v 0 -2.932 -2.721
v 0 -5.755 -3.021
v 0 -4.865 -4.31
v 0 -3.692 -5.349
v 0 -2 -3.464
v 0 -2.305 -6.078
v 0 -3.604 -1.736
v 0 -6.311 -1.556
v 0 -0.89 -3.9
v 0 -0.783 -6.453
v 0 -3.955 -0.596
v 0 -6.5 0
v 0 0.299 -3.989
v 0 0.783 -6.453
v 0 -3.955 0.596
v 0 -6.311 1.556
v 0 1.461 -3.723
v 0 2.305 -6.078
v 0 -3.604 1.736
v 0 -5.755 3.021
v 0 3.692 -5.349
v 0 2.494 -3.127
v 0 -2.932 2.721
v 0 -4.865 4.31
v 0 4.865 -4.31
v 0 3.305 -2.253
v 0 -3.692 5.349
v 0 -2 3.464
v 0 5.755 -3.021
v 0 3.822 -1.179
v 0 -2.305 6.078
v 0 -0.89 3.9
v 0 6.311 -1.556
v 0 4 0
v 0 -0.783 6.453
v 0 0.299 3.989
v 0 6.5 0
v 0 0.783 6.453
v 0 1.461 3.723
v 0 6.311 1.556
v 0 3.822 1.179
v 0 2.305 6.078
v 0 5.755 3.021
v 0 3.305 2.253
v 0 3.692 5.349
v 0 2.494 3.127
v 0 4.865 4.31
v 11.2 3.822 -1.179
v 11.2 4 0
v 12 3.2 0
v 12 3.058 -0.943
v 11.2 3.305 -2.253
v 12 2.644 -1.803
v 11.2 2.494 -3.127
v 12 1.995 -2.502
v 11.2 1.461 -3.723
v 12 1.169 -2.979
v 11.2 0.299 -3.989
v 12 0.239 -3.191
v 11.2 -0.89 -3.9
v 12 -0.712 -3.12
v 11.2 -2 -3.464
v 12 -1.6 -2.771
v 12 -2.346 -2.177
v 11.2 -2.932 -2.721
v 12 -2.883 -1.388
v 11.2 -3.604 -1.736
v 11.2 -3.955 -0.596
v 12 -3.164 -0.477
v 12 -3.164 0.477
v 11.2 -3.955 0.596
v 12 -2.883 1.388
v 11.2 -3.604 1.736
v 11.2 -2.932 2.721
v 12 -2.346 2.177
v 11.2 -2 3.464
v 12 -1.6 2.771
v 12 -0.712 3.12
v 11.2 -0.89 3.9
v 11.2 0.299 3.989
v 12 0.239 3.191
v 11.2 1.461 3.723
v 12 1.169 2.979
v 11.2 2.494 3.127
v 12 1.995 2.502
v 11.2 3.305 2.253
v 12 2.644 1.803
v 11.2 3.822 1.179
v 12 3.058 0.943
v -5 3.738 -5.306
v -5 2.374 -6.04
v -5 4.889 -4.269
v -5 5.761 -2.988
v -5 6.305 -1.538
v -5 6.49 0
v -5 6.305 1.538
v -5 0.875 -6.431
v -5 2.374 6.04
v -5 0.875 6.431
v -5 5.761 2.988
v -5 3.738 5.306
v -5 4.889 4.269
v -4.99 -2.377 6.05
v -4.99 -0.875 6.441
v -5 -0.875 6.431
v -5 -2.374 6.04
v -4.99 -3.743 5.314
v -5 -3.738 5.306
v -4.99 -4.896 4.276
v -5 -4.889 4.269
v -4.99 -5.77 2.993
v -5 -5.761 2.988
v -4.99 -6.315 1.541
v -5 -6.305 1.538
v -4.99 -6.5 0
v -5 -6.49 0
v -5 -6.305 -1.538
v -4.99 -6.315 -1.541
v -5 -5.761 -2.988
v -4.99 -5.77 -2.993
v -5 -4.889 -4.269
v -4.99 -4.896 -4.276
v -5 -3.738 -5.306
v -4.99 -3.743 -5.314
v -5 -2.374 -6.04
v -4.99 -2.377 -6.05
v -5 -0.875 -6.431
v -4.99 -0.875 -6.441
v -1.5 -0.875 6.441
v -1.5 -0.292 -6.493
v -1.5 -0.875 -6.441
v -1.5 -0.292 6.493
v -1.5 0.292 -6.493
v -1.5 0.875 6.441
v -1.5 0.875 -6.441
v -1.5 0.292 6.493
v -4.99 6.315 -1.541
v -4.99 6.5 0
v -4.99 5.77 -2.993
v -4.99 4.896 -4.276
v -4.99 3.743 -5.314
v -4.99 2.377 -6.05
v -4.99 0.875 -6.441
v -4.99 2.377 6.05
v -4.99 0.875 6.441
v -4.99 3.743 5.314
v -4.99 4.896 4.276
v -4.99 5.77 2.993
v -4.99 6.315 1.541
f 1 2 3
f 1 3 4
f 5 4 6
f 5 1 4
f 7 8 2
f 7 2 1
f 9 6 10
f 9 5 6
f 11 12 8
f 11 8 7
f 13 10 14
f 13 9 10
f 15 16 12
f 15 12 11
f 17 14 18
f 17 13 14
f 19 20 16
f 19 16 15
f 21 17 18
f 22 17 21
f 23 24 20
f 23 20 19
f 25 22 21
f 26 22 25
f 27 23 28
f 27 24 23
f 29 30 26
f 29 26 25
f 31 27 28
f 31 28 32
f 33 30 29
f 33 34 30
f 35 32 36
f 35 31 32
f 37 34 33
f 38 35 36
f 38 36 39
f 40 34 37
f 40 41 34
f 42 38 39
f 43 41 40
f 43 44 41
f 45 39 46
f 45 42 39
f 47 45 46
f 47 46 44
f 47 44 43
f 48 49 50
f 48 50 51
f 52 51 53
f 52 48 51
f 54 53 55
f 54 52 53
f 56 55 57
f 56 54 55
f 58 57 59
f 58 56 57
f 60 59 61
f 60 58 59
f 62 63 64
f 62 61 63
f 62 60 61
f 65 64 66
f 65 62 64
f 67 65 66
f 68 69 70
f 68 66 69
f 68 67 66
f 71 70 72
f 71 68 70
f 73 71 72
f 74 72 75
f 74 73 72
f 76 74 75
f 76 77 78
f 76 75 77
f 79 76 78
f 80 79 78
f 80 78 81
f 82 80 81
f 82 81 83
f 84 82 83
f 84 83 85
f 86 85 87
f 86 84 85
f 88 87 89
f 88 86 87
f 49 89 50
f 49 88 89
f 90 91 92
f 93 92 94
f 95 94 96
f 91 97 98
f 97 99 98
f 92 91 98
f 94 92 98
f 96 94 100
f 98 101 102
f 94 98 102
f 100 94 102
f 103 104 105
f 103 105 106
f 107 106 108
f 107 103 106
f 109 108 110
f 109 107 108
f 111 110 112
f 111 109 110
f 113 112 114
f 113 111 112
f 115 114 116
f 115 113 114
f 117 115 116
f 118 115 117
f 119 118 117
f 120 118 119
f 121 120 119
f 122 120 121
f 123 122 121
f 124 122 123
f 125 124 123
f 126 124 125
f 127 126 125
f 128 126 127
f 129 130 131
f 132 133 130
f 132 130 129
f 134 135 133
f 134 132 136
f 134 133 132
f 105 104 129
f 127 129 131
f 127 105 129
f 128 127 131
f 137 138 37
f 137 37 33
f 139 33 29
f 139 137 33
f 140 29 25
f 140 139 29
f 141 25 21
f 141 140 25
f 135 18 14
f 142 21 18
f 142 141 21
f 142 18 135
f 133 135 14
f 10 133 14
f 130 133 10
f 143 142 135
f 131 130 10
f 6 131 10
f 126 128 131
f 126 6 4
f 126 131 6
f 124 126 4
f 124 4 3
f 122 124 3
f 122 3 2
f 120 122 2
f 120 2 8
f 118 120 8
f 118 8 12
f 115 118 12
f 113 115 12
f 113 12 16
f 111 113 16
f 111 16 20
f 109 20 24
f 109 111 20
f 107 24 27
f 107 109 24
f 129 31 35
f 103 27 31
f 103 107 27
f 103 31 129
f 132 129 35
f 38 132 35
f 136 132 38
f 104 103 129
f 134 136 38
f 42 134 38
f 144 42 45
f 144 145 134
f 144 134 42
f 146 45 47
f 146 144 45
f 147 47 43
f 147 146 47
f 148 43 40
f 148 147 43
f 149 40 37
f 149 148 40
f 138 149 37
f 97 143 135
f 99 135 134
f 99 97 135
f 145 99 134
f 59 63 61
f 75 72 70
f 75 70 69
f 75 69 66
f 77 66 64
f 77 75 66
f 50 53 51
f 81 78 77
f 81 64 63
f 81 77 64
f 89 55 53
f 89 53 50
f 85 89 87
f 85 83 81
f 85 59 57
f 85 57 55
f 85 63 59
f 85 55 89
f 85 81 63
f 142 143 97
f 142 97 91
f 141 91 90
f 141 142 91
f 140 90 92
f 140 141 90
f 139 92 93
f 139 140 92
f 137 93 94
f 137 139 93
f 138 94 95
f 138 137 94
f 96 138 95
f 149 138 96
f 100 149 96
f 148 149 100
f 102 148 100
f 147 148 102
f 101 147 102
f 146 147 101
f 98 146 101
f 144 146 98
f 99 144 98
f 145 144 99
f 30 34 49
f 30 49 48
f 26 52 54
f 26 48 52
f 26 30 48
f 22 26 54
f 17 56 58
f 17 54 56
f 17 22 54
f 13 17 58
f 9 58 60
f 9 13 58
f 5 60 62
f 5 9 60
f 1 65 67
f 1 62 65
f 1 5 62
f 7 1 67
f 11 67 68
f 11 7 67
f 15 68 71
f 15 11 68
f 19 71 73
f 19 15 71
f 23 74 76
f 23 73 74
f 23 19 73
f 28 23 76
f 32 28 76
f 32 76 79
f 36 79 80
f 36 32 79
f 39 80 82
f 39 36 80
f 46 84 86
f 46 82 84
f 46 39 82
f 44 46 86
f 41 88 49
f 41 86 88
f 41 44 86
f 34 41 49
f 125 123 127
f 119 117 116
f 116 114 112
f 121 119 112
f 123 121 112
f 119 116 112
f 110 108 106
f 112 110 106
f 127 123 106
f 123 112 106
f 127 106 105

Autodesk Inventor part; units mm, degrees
ref_plane "YZ Plane" through (0, 0, 0) normal (1, 0, 0) x (0, 1, 0)
ref_plane "XZ Plane" through (0, 0, 0) normal (0, 1, 0) x (-1, 0, 0)
sketch "Эскиз1" plane through (0, 0, 0) normal (0, 0, 1) x (1, 0, 0)
  line L0 (-5, 0) -> (12, 0)
  line L1 (12, 0) -> (12, 4)
  line L2 (12, 4) -> (1.25, 4)
  line L3 (1.25, 4) -> (0.4832, 4)
  line L4 (0.4832, 4) -> (0, 4)
  line L5 (0, 4) -> (0, 6.5)
  line L6 (-8.4, 0) -> (15.4, 0) projected
  line L7 (0, -1.3) -> (0, 7.8) projected
  line L8 (-5, 0) -> (-5, 6.5)
  line L9 (0, 6.5) -> (-5, 6.5)
  dimension "d0" = 12
  dimension "d1" = 10.75
  dimension "d2" = 0.7668
  dimension "d3" = 5
  dimension "d4" = 8
  dimension "d5" = 8
  dimension "d9" = 13
  dimension "d10" = 0
revolve "Базовый элемент" add sketch "Эскиз1" angle 360 about axis through (-5, 0, 0) along (1, 0, 0)
sketch "Эскиз2" plane through (-5, 0, 0) normal (-1, 0, 0) x (0, 0, 1)
  circle A0 centre (0, 0) radius 6.5 projected
  line L0 (0, 0) -> (0, 6.5) projected
  line L1 (-6.5, 0.875) -> (6.5, 0.875)
  line L2 (6.5, 0.875) -> (6.5, -0.875)
  line L3 (6.5, -0.875) -> (-6.5, -0.875)
  line L4 (-6.5, -0.875) -> (-6.5, 0.875)
  line L5 (-6.5, 0) -> (6.5, 0) construction
  line L6 (0, 0.875) -> (0, -0.875) construction
  dimension "d11" = 1.75
  dimension "d12" = 13
fillet "Сопряжение1" radius 0.01 1 edges at (-5, -6.5, 0)
extrude "Паз" cut sketch "Эскиз2" against normal blind 3.5 contours A0 L3 L1 | L2 L3 A0 | A0 L1 L2 | L3 L4 A0 | A0 L4 L1
thread "Резьба" size "M8x1.25" class "6g" standard "ISO Metric profile" length 10.75
chamfer "Chamfer4" distance 0.8 angle 45 1 edges at (12, -4, 0)
ref_plane "Work Plane1" through (30.1625, 0, 0) normal (0, 0, -1) x (1, 0, 0)
equation "\"d11\" = SBR"
equation "\"d12\" = KOD"
equation "\"d13\" = RR"
equation "\"d16\" = STI"
equation "\"d14\" = GEL"
equation "\"d40\" = 0.1 * GD"
equation "\"d0\" = NLG"
equation "\"d1\" = GEL"
equation "\"d2\" = GAL"
equation "\"d3\" = KOH"
equation "\"d4\" = GD"
equation "\"d5\" = BDM"
equation "\"d9\" = KOD"
equation "\"GD\" = NND"
equation "\"NLG\" = 12"
equation "\"GEL\" = 10.75"
equation "\"KOD\" = 13"
equation "\"KOH\" = 5"
equation "\"GAL\" = 0.61345 * PTC"
equation "\"BDM\" = NND"
equation "\"RR\" = 0.01"
equation "\"SBR\" = 1.75"
equation "\"STI\" = 3.5"
equation "\"KEWI\" = 0"
equation "\"GUL\" = 0.61345 * PTC"
equation "\"SPD\" = NND - 1.2269 * PTC"
equation "\"PTC\" = 1.25"
equation "\"THREADDIA\" = 8"
equation "\"TOA\" = 30deg"
equation "\"FAWI\" = 45deg"
equation "\"NND\" = 8"
equation "\"GD1\" = THREADDIA - 1.2269 * PTC"
properties part number "Винт M8-6gx12 ГОСТ 1491-80" material "Сталь, мягкая"
